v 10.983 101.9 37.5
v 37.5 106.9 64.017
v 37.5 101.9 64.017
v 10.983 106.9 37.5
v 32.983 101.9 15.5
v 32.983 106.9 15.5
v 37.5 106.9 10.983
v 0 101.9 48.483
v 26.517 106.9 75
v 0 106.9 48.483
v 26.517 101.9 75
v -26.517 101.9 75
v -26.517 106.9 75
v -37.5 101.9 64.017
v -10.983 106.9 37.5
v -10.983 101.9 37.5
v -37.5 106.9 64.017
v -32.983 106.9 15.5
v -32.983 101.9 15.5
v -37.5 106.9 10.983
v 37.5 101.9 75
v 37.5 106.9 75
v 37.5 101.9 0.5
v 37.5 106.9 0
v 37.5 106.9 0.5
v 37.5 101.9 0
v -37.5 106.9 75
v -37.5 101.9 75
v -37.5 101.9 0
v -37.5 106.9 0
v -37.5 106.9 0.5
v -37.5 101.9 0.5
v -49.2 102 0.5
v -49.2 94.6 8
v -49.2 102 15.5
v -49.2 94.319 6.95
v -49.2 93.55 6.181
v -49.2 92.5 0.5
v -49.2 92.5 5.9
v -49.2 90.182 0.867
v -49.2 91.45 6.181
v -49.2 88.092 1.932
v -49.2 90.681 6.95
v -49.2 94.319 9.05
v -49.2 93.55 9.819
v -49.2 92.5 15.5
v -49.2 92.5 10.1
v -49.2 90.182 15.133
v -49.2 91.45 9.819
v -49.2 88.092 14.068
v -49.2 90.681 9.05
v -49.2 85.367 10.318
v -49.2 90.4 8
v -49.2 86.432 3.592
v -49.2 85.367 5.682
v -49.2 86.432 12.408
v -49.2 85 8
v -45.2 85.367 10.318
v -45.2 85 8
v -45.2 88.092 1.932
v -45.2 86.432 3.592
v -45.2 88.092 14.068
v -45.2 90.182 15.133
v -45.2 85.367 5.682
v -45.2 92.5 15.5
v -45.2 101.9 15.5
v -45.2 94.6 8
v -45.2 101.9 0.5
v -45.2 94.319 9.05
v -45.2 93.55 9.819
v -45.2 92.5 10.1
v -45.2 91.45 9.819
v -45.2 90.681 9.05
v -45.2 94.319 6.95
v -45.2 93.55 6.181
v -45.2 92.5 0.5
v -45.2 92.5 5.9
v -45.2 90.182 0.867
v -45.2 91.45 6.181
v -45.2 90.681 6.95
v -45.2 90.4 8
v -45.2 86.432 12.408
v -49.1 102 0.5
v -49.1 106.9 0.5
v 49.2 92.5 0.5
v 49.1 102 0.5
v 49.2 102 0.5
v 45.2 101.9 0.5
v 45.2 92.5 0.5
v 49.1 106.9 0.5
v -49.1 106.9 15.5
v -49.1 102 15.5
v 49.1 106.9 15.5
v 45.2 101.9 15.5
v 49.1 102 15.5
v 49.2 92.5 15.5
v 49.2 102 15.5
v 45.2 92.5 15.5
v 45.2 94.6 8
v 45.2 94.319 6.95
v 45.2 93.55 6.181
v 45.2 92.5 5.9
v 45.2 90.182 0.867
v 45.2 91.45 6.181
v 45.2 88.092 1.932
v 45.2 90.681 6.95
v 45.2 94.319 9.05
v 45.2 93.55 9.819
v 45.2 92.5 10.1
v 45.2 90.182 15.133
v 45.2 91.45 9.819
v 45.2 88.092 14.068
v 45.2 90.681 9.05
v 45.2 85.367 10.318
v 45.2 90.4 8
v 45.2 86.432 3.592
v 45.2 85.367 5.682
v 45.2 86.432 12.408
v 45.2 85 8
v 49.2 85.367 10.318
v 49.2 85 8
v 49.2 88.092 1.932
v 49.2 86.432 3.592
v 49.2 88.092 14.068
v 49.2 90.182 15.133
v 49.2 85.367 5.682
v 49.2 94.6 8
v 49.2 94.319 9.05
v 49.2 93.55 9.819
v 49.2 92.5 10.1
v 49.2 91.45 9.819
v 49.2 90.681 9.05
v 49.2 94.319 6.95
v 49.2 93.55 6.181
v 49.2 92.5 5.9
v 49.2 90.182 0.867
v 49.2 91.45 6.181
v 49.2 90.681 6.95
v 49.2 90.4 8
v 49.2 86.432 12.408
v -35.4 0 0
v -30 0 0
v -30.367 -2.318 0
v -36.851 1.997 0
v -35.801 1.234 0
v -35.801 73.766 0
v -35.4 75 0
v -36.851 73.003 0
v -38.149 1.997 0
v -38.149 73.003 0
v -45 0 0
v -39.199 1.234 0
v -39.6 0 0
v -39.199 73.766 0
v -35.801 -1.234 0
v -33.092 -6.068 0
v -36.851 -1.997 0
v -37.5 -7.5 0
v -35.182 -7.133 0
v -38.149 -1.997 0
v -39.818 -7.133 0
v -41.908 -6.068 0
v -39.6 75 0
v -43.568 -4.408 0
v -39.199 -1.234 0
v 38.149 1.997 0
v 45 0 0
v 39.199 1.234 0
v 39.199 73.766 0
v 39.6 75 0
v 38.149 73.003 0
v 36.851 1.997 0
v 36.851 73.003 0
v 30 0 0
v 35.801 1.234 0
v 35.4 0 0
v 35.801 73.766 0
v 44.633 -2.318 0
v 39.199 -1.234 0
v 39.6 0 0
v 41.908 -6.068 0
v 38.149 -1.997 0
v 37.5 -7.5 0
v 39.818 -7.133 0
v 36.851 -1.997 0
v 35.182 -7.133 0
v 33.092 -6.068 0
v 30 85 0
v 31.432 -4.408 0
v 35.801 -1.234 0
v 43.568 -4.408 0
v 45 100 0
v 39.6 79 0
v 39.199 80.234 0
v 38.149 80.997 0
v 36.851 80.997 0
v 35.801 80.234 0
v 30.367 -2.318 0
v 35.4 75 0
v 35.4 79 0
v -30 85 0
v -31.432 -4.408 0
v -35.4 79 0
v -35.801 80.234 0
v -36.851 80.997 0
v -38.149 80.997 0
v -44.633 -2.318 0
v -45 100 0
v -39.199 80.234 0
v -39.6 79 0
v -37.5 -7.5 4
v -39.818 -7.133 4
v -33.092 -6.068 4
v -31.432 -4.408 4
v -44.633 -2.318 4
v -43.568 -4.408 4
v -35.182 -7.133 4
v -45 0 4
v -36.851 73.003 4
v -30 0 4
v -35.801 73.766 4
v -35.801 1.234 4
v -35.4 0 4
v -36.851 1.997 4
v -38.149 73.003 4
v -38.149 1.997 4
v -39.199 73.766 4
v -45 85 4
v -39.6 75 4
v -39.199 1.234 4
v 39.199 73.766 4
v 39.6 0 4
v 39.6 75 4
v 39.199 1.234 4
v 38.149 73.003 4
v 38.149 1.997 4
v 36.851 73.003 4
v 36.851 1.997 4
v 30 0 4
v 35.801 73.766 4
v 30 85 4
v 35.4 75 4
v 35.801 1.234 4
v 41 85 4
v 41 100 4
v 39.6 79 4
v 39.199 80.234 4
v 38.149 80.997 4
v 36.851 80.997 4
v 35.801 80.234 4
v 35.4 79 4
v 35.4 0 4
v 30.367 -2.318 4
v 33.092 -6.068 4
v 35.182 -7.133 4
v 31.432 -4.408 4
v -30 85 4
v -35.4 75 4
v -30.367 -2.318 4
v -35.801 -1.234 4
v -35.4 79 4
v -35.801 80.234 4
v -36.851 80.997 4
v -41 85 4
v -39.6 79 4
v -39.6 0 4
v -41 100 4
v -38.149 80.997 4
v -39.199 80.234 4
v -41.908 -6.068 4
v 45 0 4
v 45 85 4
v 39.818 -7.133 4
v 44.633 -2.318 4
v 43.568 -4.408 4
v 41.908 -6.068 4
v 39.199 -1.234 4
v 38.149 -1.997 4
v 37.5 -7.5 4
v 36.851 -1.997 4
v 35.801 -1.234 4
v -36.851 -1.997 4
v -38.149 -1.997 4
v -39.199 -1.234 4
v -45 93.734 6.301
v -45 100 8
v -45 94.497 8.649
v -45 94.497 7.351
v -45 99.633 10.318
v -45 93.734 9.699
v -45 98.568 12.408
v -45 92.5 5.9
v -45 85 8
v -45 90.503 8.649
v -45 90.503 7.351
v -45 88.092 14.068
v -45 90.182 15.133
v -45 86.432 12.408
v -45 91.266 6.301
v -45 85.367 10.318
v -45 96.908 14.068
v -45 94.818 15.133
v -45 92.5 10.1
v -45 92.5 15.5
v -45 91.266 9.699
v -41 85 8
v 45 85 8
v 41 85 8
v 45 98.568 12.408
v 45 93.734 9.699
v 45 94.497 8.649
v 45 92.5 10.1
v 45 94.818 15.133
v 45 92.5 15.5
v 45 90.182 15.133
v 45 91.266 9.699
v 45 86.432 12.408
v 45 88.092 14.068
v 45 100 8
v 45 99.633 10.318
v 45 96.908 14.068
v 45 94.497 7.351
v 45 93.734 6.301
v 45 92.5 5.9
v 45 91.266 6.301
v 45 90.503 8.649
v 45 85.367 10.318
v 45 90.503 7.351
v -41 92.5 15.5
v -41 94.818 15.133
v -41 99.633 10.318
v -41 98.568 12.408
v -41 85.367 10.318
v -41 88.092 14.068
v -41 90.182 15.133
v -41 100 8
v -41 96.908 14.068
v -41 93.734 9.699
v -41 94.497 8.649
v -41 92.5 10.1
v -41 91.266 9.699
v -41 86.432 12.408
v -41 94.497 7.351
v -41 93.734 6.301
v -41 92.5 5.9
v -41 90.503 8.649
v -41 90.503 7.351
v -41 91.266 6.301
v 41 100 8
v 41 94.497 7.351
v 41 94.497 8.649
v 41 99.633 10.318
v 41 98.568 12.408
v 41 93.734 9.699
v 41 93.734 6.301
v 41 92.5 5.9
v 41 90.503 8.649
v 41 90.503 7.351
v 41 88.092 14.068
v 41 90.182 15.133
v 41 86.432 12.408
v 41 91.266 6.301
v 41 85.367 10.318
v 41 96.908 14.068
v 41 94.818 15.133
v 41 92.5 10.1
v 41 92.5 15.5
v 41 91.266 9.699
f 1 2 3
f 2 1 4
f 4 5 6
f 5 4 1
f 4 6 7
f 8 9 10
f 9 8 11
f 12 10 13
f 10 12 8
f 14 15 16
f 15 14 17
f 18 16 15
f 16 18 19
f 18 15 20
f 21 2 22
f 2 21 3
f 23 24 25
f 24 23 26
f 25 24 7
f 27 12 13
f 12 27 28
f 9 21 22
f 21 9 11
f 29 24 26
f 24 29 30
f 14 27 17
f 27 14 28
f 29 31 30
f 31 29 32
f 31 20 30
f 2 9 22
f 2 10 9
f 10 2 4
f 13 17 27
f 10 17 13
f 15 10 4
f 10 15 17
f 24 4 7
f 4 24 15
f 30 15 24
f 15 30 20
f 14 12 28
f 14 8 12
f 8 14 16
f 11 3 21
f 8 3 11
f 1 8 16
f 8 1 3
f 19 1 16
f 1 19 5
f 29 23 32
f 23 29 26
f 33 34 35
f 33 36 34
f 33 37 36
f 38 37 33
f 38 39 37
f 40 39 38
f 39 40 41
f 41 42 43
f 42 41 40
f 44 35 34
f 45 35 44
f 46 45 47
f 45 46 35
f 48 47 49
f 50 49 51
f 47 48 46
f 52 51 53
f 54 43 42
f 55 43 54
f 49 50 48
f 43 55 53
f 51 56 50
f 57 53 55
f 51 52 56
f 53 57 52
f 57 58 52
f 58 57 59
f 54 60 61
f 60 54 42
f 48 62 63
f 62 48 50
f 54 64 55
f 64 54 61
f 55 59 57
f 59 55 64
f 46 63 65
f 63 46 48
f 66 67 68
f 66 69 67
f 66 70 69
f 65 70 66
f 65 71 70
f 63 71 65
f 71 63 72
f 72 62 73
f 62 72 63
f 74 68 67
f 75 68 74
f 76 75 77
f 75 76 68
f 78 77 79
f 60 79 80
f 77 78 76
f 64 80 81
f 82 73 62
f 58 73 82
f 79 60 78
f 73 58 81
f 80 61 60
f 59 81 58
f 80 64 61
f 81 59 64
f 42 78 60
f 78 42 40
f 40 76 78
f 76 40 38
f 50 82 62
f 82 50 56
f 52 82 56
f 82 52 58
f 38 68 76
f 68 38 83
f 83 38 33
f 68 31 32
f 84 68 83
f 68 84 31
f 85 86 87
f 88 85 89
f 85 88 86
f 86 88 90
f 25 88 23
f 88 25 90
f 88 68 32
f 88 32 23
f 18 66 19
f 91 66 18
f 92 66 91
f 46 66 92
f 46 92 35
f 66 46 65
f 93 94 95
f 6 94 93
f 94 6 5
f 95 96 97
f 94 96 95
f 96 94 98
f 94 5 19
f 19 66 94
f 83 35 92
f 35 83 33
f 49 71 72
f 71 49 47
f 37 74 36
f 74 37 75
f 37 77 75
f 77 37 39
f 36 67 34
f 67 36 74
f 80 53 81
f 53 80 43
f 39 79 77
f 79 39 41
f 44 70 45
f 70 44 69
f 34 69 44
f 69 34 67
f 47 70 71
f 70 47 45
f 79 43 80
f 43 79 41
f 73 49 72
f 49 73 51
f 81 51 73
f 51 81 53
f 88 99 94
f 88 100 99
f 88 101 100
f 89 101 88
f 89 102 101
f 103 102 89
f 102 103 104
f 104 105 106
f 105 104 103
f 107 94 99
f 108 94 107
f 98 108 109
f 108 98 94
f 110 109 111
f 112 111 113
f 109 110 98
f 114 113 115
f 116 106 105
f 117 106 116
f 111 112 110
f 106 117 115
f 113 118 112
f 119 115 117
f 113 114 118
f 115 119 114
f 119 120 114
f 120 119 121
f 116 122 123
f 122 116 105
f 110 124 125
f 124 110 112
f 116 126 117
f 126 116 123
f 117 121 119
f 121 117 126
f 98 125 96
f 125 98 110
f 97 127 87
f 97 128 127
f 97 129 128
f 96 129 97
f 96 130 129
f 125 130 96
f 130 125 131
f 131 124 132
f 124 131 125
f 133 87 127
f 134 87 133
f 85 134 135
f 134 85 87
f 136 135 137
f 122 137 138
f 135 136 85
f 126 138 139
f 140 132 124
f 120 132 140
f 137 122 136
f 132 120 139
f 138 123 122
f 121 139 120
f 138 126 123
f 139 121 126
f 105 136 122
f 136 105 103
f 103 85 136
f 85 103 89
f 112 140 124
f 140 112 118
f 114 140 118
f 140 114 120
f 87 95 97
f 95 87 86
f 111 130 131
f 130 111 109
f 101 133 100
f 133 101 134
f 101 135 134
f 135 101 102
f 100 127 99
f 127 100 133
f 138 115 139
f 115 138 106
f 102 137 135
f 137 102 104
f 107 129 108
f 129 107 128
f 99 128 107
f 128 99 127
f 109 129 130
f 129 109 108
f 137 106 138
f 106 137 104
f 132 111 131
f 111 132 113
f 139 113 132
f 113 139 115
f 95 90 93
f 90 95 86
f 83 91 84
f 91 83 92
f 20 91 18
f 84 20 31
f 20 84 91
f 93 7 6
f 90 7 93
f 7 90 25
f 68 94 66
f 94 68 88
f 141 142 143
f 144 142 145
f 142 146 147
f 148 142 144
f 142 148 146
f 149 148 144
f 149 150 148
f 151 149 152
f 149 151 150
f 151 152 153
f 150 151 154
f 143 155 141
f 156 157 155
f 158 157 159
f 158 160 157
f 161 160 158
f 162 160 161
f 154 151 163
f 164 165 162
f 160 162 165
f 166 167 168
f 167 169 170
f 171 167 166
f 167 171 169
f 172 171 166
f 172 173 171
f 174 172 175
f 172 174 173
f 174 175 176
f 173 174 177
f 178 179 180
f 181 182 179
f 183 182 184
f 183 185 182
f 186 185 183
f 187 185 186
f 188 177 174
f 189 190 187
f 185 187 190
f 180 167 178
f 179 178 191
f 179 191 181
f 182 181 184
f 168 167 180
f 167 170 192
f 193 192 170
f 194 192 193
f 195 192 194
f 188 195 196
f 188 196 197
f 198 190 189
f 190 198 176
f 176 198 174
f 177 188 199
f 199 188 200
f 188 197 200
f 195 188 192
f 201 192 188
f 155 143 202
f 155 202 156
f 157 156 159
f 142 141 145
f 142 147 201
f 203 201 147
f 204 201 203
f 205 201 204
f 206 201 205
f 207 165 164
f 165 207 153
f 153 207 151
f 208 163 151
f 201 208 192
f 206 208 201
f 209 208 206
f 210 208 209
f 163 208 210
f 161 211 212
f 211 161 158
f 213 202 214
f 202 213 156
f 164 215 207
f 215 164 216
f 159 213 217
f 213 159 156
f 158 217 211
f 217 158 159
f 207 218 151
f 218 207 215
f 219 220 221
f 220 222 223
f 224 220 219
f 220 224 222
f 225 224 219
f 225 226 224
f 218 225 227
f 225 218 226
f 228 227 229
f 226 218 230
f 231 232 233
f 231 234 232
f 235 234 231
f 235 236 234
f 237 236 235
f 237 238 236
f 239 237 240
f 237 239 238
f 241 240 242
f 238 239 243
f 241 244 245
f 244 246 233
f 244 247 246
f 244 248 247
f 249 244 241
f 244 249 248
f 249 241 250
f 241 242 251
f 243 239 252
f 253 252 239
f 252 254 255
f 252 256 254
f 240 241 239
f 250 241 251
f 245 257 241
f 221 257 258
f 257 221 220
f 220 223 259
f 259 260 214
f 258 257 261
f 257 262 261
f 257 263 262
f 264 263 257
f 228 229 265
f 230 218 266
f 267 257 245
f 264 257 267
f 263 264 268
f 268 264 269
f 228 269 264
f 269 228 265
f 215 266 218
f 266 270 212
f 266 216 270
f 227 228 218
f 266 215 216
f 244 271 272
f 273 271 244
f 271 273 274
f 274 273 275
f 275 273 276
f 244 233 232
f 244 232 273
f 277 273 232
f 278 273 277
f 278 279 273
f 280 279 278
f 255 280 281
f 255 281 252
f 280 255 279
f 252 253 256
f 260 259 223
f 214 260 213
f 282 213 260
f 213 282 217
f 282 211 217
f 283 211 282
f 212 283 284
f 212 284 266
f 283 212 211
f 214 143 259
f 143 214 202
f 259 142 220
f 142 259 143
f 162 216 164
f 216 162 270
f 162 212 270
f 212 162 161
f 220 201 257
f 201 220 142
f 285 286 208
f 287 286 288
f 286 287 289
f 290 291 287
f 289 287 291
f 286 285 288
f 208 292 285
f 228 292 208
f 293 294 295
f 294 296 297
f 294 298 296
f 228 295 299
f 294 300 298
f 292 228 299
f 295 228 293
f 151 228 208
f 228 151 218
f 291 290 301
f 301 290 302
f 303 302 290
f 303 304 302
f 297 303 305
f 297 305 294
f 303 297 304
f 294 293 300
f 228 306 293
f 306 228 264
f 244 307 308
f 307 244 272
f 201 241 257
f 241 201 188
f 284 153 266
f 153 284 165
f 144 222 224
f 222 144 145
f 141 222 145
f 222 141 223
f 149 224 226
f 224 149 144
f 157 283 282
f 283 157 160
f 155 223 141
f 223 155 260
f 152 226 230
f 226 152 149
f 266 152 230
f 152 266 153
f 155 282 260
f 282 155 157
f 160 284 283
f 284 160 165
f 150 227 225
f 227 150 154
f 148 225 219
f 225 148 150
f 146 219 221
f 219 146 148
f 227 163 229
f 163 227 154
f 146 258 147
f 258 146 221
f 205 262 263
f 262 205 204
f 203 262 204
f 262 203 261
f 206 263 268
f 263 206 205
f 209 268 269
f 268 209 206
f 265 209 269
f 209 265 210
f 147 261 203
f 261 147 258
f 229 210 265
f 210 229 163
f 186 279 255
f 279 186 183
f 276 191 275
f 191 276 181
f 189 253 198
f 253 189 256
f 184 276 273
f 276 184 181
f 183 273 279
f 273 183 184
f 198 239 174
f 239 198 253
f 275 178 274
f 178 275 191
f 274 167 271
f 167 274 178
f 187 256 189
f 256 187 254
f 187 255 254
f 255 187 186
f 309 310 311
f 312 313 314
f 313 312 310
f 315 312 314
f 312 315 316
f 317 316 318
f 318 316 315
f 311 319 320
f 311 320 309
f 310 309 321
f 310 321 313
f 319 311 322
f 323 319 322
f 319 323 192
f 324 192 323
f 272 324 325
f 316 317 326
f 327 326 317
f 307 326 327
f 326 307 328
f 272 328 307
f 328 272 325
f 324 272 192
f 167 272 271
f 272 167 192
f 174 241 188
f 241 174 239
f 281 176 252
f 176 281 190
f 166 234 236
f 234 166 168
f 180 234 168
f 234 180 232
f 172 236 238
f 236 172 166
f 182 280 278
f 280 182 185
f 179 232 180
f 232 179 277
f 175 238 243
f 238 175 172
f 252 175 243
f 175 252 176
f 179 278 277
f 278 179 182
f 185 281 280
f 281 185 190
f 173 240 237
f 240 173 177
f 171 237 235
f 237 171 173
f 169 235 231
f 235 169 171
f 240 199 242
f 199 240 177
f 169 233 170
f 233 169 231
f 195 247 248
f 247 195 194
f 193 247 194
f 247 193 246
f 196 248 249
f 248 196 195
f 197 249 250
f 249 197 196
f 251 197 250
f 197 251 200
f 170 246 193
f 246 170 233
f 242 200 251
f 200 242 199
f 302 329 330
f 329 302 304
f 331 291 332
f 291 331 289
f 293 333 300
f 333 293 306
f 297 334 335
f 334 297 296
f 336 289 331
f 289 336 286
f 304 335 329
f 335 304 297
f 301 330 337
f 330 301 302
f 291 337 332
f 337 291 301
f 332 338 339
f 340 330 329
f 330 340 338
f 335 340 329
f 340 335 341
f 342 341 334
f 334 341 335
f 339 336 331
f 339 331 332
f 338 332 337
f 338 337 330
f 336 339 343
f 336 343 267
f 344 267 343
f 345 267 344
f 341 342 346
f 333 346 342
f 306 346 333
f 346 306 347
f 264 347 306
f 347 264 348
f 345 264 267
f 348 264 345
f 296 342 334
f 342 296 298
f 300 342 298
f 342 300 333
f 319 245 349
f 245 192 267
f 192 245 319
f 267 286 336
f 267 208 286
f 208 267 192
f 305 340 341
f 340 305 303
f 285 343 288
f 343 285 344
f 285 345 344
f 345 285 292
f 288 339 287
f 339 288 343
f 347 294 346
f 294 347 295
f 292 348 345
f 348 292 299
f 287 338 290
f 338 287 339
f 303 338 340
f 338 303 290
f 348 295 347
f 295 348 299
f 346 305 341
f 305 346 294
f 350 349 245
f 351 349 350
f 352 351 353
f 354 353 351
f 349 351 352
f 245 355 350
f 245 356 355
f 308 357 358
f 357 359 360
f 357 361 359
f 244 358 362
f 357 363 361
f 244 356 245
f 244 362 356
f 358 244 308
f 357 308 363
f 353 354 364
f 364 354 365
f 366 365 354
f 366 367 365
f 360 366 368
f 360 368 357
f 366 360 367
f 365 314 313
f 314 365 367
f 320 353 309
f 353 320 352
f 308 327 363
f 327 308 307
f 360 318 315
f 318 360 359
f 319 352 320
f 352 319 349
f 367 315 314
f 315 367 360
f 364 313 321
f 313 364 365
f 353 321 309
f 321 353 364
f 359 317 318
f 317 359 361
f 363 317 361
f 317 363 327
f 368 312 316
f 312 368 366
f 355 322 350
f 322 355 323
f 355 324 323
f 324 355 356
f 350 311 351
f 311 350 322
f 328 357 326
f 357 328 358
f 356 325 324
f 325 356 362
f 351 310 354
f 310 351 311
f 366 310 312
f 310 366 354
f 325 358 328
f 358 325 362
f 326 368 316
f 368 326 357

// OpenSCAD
//Customizable VESA mount
//by eriqjo February 21, 2015

//TODO  redundant top plate support (rectangle between the semi-circles)

//CUSTOMIZER VARIABLES

/* [Global] */

//Which parts do you want to make?
Make_Part = 3; // [1:Back Bracket, 2:Top Plate, 3:Both]

/* [Back Bracket] */

//Choose the VESA mount size, mm
VESA_Size = 75; // [75:75x75, 100:100x100, 200:200x200]

//What are you mounting to?
Mount_To =1; // [1:Direct to monitor/TV, 2:Wall mounting bracket]

//Mounting bolt diameter, mm:
Bolt_Dia = 4; // [3:8]

//Bracket width, mm:
Bracket_Width = 15; // [9:30]

//Bracket thickness, mm:
Bracket_Thickness = 4; // [4:20]

//Distance from top bracket hole to top of monitor/TV
Height_To_Top = 10;

/* [Top Plate] */

//Top plate style
Top_Style = 2; // [1:Solid(square), 2:Lite(x)]

//Top plate thickness, mm: 
Plate_Thickness = 5; // [3:8]

//The width of the box you are mounting, mm
Plate_Width = 75;

//The depth of the box you are mounting, mm
Plate_Depth = 75;

//How far back should the top plate be shifted, mm
Shift_Top_Back = 0;

//CUSTOMIZER VARIABLES END

slop = 0.2 * 1;

module buildBack(ydim = 25){

	topLength = Height_To_Top + ydim;

	difference(){
		union(){
			for(i = [-1, 1]){			//creating the two legs of the bracket
				translate([ i * VESA_Size/2, 0, 0])
					difference(){
						union(){
							cylinder(h = Bracket_Thickness, r = Bracket_Width/2, $fn = 20);		//bottom of leg
							translate([-Bracket_Width/2, 0, 0])									//leg
								cube([Bracket_Width, topLength, Bracket_Thickness]);			
						} // union
						translate([0, 0, -0.1])
							cylinder(h = Bracket_Thickness + slop, r = (Bolt_Dia + slop)/2, $fn = 10);	// bottom hole
						translate([0, ydim, -0.1])
							cylinder(h = Bracket_Thickness + slop, r = (Bolt_Dia + slop)/2, $fn = 10);  //bottom of slot
						translate([0, ydim + Bolt_Dia, -0.1])
							cylinder(h = Bracket_Thickness + slop, r = (Bolt_Dia + slop)/2 , $fn = 10); //top of slot
						translate([-(Bolt_Dia + slop)/2, ydim, -0.1])
							cube([Bolt_Dia + slop, Bolt_Dia, Bracket_Thickness + 0.2]);					//between the slot
					} // difference
			} // for
			translate([-Bracket_Width/2 - VESA_Size/2, topLength, 0])					//top portion of the bracket
				cube([VESA_Size + Bracket_Width, Bracket_Width, Bracket_Thickness]);
			for(i = [-1, 1]){
				translate([ i * (Bracket_Width/2 - Bracket_Thickness/2 + VESA_Size/2 ), topLength + Bracket_Width/2, Bracket_Thickness + (Bolt_Dia/2) + 2]){ // start of the semi-circle mounts
					rotate([0, 90, 0]){
						difference(){
							union(){
								cylinder( h = Bracket_Thickness, r = Bracket_Width/2, center = true, $fn = 20);
								translate([Bracket_Width/4, 0, 0,])
									cube([Bracket_Width/2, Bracket_Width, Bracket_Thickness], center = true);
							} // union
							cylinder(h = Bracket_Thickness + slop, r = (Bolt_Dia + slop)/2, center = true, $fn = 10);
						}//difference
					}//rotate	
				}//translate
			}//for	
		} // union
		translate([0, 0, -20]) {
			cube([300, 300, 40], center = true);
		}//translate
	}//difference
}//module buildBack

module buildTop(ydim = 25){	

	topLength = Height_To_Top + ydim;
	unit = min(Plate_Depth, Plate_Width)/2;
	
	union(){
		if(Top_Style == 1){		//solid square top plate
			translate([0, Plate_Thickness/2  + topLength + 1.9 + Bracket_Width, Plate_Depth/2 - Shift_Top_Back])  //original

				cube([Plate_Width, Plate_Thickness, Plate_Depth], center = true);
		}//if
		
		if(Top_Style == 2){		//Lite X-style top plate
			translate([0, Plate_Thickness/2  + topLength + 1.9 + Bracket_Width, Plate_Depth/2 - Shift_Top_Back])
				difference(){
					cube([Plate_Width, Plate_Thickness, Plate_Depth], center = true);								//plate itself
					for(i = [[Plate_Width/2, 0, 0], [0, 0, Plate_Depth/2], [-Plate_Width/2, 0, 0]]){
						translate(i)	
							rotate([0, 45, 0]){
								cube([unit, Plate_Thickness+1, unit], center = true);
							}//rotate
					}//for
				}//difference	
		}//if
		for(i = [-1,1]){
			translate([i * (Bracket_Thickness/2 + VESA_Size/2 + Bracket_Width/2 + slop), topLength + Bracket_Width/2, Bracket_Thickness + (Bolt_Dia/2) + 2]){
				rotate([0, 90, 0]){
					difference(){
						union(){
							cylinder( h = Bracket_Thickness, r = Bracket_Width/2, center = true, $fn = 20);			//swivel attachment semi-circle
							translate([0,Bracket_Width/4 + 1,0])
								cube([Bracket_Width, Bracket_Width/2 + 2, Bracket_Thickness], center = true);		//swivel attachment point
						}//union
						cylinder( h = Bracket_Thickness + slop, r = (Bolt_Dia + slop)/2, center = true, $fn = 12);  //swivel hole
					}//difference
				}//rotate	
			}//translate
		}//for
		translate([0, Plate_Thickness/2  + topLength + 1.9 + Bracket_Width, Bracket_Thickness + (Bolt_Dia/2) + 2])
			cube([2*Bracket_Thickness + VESA_Size + Bracket_Width +slop, Plate_Thickness, Bracket_Width], center = true);
	}//union		
}//module buildTop

if (Mount_To == 1){
	if(Make_Part == 1) {buildBack(ydim = VESA_Size);}
	if(Make_Part == 2) {buildTop(ydim = VESA_Size);}
	if(Make_Part == 3) {buildTop(ydim = VESA_Size); buildBack(ydim = VESA_Size);}
}// if

if (Mount_To == 2){
	if(Make_Part == 1) {buildBack(ydim = 25);}
	if(Make_Part == 2) {buildTop(ydim = 25);}
	if(Make_Part == 3) {buildTop(ydim = 25); buildBack(ydim = 25);}
}// if
